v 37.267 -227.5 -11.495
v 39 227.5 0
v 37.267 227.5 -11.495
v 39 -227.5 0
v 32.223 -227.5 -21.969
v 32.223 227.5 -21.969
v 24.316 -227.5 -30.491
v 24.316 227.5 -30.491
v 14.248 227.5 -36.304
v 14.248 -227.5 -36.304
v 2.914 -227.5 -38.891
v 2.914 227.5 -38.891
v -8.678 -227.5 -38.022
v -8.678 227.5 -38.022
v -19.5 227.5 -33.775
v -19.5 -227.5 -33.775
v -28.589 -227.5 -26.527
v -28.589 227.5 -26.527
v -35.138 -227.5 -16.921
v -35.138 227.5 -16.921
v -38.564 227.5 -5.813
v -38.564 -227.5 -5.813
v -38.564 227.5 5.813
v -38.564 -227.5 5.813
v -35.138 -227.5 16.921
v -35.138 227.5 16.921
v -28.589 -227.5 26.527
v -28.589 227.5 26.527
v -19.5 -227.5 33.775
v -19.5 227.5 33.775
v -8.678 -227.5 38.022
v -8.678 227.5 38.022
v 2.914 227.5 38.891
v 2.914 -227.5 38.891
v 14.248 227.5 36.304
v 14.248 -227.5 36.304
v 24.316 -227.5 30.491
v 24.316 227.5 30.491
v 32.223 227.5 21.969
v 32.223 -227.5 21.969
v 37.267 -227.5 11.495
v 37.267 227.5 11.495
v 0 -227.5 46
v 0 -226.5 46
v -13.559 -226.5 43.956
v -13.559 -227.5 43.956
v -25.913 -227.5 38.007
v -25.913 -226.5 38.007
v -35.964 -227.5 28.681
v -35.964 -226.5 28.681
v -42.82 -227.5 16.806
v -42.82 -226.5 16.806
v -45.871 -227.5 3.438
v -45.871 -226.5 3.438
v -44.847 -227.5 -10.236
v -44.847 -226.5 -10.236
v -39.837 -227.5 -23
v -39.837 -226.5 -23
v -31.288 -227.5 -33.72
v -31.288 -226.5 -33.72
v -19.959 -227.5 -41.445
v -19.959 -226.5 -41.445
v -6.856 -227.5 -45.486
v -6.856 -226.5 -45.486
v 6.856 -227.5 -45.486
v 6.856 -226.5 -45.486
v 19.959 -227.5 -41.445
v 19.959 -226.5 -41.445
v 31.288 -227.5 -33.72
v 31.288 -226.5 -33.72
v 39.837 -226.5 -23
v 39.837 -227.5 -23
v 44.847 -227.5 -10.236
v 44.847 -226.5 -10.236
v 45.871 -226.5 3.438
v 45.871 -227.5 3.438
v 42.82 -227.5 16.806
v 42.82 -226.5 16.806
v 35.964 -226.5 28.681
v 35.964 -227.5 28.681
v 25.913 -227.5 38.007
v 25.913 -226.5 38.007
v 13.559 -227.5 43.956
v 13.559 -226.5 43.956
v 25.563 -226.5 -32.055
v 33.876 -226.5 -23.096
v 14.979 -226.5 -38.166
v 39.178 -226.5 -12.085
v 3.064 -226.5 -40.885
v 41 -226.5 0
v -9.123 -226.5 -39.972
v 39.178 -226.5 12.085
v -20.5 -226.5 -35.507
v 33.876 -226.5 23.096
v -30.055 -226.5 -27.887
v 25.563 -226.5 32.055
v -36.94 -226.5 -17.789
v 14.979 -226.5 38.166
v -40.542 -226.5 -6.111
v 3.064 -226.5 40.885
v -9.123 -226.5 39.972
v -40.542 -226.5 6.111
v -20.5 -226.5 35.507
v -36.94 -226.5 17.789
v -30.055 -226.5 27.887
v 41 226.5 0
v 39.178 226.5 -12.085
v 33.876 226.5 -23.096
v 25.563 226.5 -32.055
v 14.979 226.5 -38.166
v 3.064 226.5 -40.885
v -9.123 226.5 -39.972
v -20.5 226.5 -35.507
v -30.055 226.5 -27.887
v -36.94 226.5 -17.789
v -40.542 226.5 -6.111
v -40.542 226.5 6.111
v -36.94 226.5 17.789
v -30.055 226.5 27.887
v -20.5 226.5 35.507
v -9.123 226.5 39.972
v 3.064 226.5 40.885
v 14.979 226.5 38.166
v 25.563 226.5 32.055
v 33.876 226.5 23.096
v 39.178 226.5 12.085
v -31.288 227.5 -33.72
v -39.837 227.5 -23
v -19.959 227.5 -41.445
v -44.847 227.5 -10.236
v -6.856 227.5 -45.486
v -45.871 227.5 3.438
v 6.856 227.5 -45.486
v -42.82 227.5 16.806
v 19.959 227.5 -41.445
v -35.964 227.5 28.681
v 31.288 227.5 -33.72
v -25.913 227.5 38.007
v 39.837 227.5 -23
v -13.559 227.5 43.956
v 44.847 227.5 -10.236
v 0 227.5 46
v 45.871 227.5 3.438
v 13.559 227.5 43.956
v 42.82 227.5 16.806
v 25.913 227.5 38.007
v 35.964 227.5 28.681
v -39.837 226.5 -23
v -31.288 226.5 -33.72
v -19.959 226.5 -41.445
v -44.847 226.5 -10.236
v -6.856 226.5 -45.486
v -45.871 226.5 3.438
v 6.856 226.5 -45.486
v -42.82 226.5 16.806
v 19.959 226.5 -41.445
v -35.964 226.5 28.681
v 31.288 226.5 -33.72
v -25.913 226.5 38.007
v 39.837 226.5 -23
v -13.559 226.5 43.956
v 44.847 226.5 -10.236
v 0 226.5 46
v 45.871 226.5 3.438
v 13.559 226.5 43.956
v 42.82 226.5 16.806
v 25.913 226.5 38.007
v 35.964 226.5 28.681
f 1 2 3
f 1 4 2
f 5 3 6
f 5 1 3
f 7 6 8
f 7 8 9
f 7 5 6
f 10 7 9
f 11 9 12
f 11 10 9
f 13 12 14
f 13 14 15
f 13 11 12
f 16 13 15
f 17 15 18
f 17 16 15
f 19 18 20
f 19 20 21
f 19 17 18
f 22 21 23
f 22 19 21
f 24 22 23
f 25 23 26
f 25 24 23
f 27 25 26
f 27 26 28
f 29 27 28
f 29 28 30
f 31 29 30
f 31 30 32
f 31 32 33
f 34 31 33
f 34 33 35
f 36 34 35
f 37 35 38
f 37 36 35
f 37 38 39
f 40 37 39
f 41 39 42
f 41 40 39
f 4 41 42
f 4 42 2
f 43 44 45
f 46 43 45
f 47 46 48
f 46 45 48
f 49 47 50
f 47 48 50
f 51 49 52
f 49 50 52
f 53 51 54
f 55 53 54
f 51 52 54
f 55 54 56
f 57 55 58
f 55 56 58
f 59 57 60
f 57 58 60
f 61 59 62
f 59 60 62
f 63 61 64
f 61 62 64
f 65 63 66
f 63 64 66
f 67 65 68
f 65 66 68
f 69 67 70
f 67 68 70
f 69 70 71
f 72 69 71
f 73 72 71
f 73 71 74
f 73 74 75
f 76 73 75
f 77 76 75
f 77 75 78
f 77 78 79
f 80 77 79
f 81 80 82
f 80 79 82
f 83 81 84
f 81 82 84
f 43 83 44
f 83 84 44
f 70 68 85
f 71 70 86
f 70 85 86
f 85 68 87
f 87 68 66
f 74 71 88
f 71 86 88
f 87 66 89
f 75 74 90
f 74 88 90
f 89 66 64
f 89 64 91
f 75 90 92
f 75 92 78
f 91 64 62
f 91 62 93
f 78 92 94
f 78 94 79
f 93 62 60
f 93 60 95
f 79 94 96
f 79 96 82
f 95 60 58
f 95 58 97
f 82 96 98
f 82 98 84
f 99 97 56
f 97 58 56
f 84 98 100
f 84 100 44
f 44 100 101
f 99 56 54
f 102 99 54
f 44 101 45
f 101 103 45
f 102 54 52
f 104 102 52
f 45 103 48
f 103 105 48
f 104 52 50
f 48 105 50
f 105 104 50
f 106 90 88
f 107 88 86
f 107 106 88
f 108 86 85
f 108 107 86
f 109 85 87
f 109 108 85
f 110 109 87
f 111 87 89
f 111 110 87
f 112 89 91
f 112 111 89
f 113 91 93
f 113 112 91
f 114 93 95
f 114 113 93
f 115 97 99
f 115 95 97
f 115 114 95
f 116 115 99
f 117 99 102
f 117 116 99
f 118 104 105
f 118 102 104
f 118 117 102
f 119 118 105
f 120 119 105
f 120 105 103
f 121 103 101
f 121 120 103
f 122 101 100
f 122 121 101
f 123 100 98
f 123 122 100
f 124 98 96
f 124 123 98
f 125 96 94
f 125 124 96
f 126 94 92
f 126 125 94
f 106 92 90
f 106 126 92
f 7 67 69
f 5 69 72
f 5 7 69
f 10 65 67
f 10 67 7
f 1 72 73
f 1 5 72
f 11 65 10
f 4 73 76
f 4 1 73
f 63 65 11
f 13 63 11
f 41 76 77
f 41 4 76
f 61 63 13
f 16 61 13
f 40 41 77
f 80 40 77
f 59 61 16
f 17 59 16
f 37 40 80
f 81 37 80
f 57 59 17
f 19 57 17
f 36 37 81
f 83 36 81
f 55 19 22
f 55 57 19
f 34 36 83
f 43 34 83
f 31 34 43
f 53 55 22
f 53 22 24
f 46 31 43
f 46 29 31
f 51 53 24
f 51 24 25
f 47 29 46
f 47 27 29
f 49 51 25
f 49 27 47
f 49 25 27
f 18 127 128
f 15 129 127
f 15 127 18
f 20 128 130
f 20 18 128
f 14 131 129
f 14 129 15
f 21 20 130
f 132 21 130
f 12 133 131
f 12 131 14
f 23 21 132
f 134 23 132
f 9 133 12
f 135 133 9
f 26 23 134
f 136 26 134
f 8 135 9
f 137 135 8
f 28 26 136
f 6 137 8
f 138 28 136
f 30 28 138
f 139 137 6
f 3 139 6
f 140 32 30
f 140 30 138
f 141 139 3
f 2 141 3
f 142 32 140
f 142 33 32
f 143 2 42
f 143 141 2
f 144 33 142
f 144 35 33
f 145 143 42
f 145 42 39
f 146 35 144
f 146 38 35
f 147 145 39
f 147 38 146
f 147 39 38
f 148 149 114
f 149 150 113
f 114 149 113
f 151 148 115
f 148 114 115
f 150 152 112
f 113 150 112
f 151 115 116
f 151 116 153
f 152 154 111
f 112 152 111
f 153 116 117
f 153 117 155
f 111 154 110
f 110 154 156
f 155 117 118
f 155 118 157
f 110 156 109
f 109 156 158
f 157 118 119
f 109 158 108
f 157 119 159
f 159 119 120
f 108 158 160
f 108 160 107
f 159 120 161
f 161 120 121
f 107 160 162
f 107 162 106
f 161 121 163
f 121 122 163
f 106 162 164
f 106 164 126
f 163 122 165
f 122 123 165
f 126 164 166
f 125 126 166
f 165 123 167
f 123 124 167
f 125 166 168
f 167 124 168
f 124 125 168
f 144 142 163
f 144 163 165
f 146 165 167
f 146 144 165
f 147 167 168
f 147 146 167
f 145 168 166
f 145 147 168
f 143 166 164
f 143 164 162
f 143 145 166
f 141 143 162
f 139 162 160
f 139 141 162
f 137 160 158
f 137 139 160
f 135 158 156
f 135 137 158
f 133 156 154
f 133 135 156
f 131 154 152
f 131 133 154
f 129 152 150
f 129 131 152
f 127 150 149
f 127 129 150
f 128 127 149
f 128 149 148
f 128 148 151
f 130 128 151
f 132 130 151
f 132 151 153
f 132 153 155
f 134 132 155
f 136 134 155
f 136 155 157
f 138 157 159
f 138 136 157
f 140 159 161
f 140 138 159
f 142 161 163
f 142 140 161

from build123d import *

# Parameters (mm, degrees)
SCHIZZO1_R                   = 41
SCHIZZO1_R_2                 = 39
ESTRUSIONE_SOTTILE1_DEPTH    = 227.5
SCHIZZO2_R                   = 46
SCHIZZO2_R_2                 = 41
ESTRUSIONE_ESTRUSIONE1_DEPTH = 1
ESTRUSIONE_ESTRUSIONE2_START = -1
SCHIZZO3_R                   = 46
SCHIZZO3_R_2                 = 41
ESTRUSIONE_ESTRUSIONE2_DEPTH = 1


with BuildPart() as part:
    # Schizzo1 → Estrusione-Sottile1 (new, symmetric)
    with BuildSketch(Plane(origin=(0, 0, 0), x_dir=(1, 0, 0), z_dir=(0, 1, 0))):
        Circle(SCHIZZO1_R)
        Circle(SCHIZZO1_R_2, mode=Mode.SUBTRACT)
    extrude(amount=ESTRUSIONE_SOTTILE1_DEPTH, both=True)

    # Schizzo2 → Estrusione-Estrusione1 (add)
    with BuildSketch(Plane(origin=(0, 227.5, 0), x_dir=(1, 0, 0), z_dir=(0, 1, 0))):
        with Locations(Location((0, 0, 0), (0, 0, 270))):
            Circle(SCHIZZO2_R)
        with Locations(Location((0, 0, 0), (0, 0, 90))):
            Circle(SCHIZZO2_R_2, mode=Mode.SUBTRACT)
    extrude(amount=-ESTRUSIONE_ESTRUSIONE1_DEPTH)

    # Schizzo3 → Estrusione-Estrusione2 (add)
    with BuildSketch(Plane.XZ.offset(227.5).offset(ESTRUSIONE_ESTRUSIONE2_START)):
        with Locations(Location((0, 0, 0), (0, 0, 90))):
            Circle(SCHIZZO3_R)
        with Locations(Location((0, 0, 0), (0, 0, 270))):
            Circle(SCHIZZO3_R_2, mode=Mode.SUBTRACT)
    extrude(amount=ESTRUSIONE_ESTRUSIONE2_DEPTH)


solid = part.part
